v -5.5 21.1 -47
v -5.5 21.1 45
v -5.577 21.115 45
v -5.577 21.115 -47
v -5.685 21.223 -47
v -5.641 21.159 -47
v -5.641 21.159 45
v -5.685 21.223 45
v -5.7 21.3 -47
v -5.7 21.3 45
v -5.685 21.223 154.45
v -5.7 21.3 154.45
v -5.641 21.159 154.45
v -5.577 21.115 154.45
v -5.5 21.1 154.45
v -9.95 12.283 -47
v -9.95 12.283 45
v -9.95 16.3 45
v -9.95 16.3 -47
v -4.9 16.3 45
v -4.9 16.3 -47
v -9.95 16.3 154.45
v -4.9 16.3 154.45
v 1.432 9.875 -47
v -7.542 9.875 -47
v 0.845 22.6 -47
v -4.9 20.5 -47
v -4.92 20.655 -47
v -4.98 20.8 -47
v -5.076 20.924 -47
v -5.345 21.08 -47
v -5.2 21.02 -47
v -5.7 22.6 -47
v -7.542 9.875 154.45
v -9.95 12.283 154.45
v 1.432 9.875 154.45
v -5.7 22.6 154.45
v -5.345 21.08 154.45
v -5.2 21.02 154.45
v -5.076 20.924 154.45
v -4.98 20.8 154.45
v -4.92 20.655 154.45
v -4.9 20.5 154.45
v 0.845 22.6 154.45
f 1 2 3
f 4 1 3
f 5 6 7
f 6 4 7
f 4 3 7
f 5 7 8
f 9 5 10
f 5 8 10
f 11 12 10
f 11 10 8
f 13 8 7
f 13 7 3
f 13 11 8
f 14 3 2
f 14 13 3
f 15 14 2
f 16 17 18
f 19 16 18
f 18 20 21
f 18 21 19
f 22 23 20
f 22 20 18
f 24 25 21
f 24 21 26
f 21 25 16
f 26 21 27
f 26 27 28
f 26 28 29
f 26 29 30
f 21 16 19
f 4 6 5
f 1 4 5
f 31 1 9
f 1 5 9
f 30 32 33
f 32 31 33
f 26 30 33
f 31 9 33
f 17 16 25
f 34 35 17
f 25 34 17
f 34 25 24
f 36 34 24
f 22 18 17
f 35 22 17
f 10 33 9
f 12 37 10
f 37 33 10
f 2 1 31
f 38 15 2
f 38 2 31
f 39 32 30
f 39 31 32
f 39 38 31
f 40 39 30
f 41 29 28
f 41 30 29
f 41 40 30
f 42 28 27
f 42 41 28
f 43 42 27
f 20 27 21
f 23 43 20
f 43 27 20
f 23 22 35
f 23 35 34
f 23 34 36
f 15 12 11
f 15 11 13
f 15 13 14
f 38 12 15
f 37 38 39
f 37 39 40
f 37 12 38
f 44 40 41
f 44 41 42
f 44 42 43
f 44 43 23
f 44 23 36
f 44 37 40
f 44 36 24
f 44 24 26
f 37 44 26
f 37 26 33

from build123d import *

# Parameters (mm, degrees)
Y_RAIL_SLOT_DEPTH      = 45
Y_RAIL_CONT_DEPTH      = 2
Z_RAIL_SLOT_DEPTH      = 45
X_RAIL_SLOT_DEPTH      = 45
TOLERANCE_START        = -45
TOLERANCE_CUT_Z_DEPTH  = 45
TOLERANCE_CUT_Y_DEPTH  = 135.627263211
TOLERANCE_CUT_X_DEPTH  = 45
SHARP_CORNER_FILLETS_R = 0.2
CUT_EXTRUDE1_DEPTH     = 135.627263211
CUT_EXTRUDE2_START     = -45
CUT_EXTRUDE2_DEPTH     = 45
SKETCH25_W             = 5.05
SKETCH25_H             = 4.200000003
SKETCH25_W_2           = 5.050000001
SKETCH25_H_2           = 4.200000002
SKETCH25_W_3           = 19.75
SKETCH25_H_3           = 19.75
CUT_EXTRUDE3_DEPTH     = 118.874933721
FILLET1_R              = 0.4
CUT_EXTRUDE4_DEPTH     = 118.874933721
BOSS_EXTRUDE1_START    = 109.45
BOSS_EXTRUDE1_DEPTH    = 109.45


with BuildPart() as part:
    # Sketch10 → Y-Rail Slot (new, symmetric)
    with BuildSketch(Plane.XY):
        with BuildLine():
            ThreePointArc((22, -5.8), (22.353553391, -5.946446609), (22.5, -6.3))
            Line((22.5, -6.3), (22.5, -19.5))
            ThreePointArc((22.5, -19.5), (21.621320343, -21.621320344), (19.499999999, -22.500000001))
            Line((19.499999999, -22.500000001), (24.499999999, -22.500000001))
            Line((24.499999999, -22.500000001), (24.499999999, 24.499999999))
            Line((24.499999999, 24.499999999), (-22.500000001, 24.499999999))
            Line((-22.500000001, 24.499999999), (-22.500000001, 19.500000001))
            ThreePointArc((-22.500000001, 19.500000001), (-21.621320345, 21.621320345), (-19.500000001, 22.500000001))
            Line((-19.500000001, 22.500000001), (-6.300000002, 22.500000001))
            ThreePointArc((-6.300000002, 22.500000001), (-5.946446612, 22.353553392), (-5.800000002, 22.000000001))
            Line((-5.800000002, 22.000000001), (-5.800000002, 21.000000004))
            Line((-5.800000002, 21.000000004), (-5.499999997, 21.000000004))
            ThreePointArc((-5.499999997, 21.000000004), (-5.146446607, 20.853553394), (-4.999999997, 20.500000004))
            Line((-4.999999997, 20.500000004), (-4.999999997, 17.525000004))
            ThreePointArc((-4.999999997, 17.525000004), (-5.146446607, 17.171446613), (-5.499999997, 17.025000004))
            Line((-5.499999997, 17.025000004), (-9.549999997, 17.025000004))
            ThreePointArc((-9.549999997, 17.025000004), (-9.903553388, 16.878553395), (-10.049999997, 16.525000004))
            Line((-10.049999997, 16.525000004), (-10.049999997, 11.757106781))
            ThreePointArc((-10.049999997, 11.757106781), (-10.011939764, 11.565765065), (-9.903553388, 11.403553391))
            Line((-9.903553388, 11.403553391), (-6.499999999, 8.000000002))
            Line((-6.499999998, 8.000000003), (2e-09, 8.000000003))
            Line((2e-09, 8.000000003), (6.500000002, 8.000000003))
            Line((6.500000002, 8.000000003), (9.903553392, 11.403553393))
            ThreePointArc((9.903553392, 11.403553393), (10.011939767, 11.565765067), (10.050000001, 11.757106783))
            Line((10.050000001, 11.757106783), (10.050000001, 16.525000003))
            ThreePointArc((10.050000001, 16.525000003), (9.903553392, 16.878553394), (9.550000001, 17.025000003))
            Line((9.550000001, 17.025000003), (5.5, 17.025000003))
            ThreePointArc((5.5, 17.025000003), (5.146446609, 17.171446613), (5, 17.525000003))
            Line((5, 17.525000003), (5, 20.500000003))
            ThreePointArc((5, 20.500000003), (5.146446609, 20.853553393), (5.5, 21.000000003))
            Line((5.5, 21.000000003), (5.800000001, 21.000000003))
            Line((5.800000001, 21.000000003), (5.800000001, 22.000000001))
            ThreePointArc((5.800000001, 22.000000001), (5.94644661, 22.353553392), (6.300000001, 22.500000001))
            Line((6.300000001, 22.500000001), (19.500000001, 22.500000001))
            ThreePointArc((19.500000001, 22.500000001), (21.621320345, 21.621320345), (22.500000001, 19.500000001))
            Line((22.500000001, 19.500000001), (22.500000001, 6.300000002))
            ThreePointArc((22.500000001, 6.300000002), (22.353553392, 5.946446612), (22.000000001, 5.800000002))
            Line((22.000000001, 5.800000002), (21.000000002, 5.800000002))
            Line((21.000000002, 5.800000002), (21.000000002, 5.500000005))
            ThreePointArc((21.000000002, 5.500000005), (20.853553393, 5.146446614), (20.500000002, 5.000000005))
            Line((20.500000002, 5.000000005), (17.525000003, 5.000000005))
            ThreePointArc((17.525000003, 5.000000005), (17.171446612, 5.146446614), (17.025000003, 5.500000005))
            Line((17.025000003, 5.500000005), (17.025000003, 10.050000003))
            Line((17.025000003, 10.050000003), (11.757106782, 10.050000003))
            ThreePointArc((11.757106782, 10.050000003), (11.565765066, 10.011939769), (11.403553391, 9.903553394))
            Line((11.403553391, 9.903553394), (8.000000002, 6.500000004))
            Line((8.000000001, 6.500000005), (8.000000001, 3e-09))
            Line((8.000000001, 3e-09), (8.000000001, -6.499999999))
            Line((8.000000001, -6.499999999), (11.40355339, -9.903553388))
            ThreePointArc((11.40355339, -9.903553388), (11.565765064, -10.011939763), (11.75710678, -10.049999997))
            Line((11.75710678, -10.049999997), (16.525, -10.049999997))
            ThreePointArc((16.525, -10.049999997), (16.878553391, -9.903553388), (17.025000001, -9.549999997))
            Line((17.025000001, -9.549999997), (17.025000001, -5.499999996))
            ThreePointArc((17.025000001, -5.499999996), (17.17144661, -5.146446605), (17.525000001, -4.999999996))
            Line((17.525000001, -4.999999996), (20.5, -4.999999996))
            ThreePointArc((20.5, -4.999999996), (20.853553391, -5.146446605), (21, -5.499999996))
            Line((21, -5.499999996), (21, -5.8))
            Line((21, -5.8), (22, -5.8))
        make_face()
    extrude(amount=Y_RAIL_SLOT_DEPTH, both=True)

    # Sketch12 → Y-Rail cont. (add)
    with BuildSketch(Plane(origin=(0, 0, -45), x_dir=(-1, 0, 0), z_dir=(0, 0, -1))):
        with BuildLine():
            Line((-22.5, -19.5), (-22.5, -6.3))
            ThreePointArc((-22.5, -6.3), (-22.353553391, -5.946446609), (-22, -5.8))
            Line((-22, -5.8), (-21, -5.8))
            Line((-21, -5.8), (-21, -5.499999996))
            ThreePointArc((-21, -5.499999996), (-20.853553391, -5.146446605), (-20.5, -4.999999996))
            Line((-20.5, -4.999999996), (-17.525000001, -4.999999996))
            ThreePointArc((-17.525000001, -4.999999996), (-17.17144661, -5.146446605), (-17.025000001, -5.499999996))
            Line((-17.025000001, -5.499999996), (-17.025000001, -9.549999997))
            ThreePointArc((-17.025000001, -9.549999997), (-16.878553391, -9.903553388), (-16.525, -10.049999997))
            Line((-16.525, -10.049999997), (-11.75710678, -10.049999997))
            ThreePointArc((-11.75710678, -10.049999997), (-11.565765064, -10.011939763), (-11.40355339, -9.903553388))
            Line((-11.40355339, -9.903553388), (-8.000000001, -6.499999999))
            Line((-8.000000001, -6.499999999), (-8.000000001, 6.500000003))
            Line((-8.000000001, 6.500000003), (-11.403553391, 9.903553394))
            ThreePointArc((-11.403553391, 9.903553394), (-11.565765066, 10.011939769), (-11.757106782, 10.050000003))
            Line((-11.757106782, 10.050000003), (-17.025000003, 10.050000003))
            Line((-17.025000003, 10.050000003), (-17.025000003, 5.500000005))
            ThreePointArc((-17.025000003, 5.500000005), (-17.171446612, 5.146446614), (-17.525000003, 5.000000005))
            Line((-17.525000003, 5.000000005), (-20.500000002, 5.000000005))
            ThreePointArc((-20.500000002, 5.000000005), (-20.853553393, 5.146446614), (-21.000000002, 5.500000005))
            Line((-21.000000002, 5.500000005), (-21.000000002, 5.800000002))
            Line((-21.000000002, 5.800000002), (-22.000000001, 5.800000002))
            ThreePointArc((-22.000000001, 5.800000002), (-22.353553392, 5.946446612), (-22.500000001, 6.300000002))
            Line((-22.500000001, 6.300000002), (-22.500000001, 19.500000001))
            ThreePointArc((-22.500000001, 19.500000001), (-21.621320345, 21.621320345), (-19.500000001, 22.500000001))
            Line((-19.500000001, 22.500000001), (-6.300000001, 22.500000001))
            ThreePointArc((-6.300000001, 22.500000001), (-5.94644661, 22.353553392), (-5.800000001, 22.000000001))
            Line((-5.800000001, 22.000000001), (-5.800000001, 21.000000003))
            Line((-5.800000001, 21.000000003), (-5.5, 21.000000003))
            ThreePointArc((-5.5, 21.000000003), (-5.146446609, 20.853553393), (-5, 20.500000003))
            Line((-5, 20.500000003), (-5, 17.525000003))
            ThreePointArc((-5, 17.525000003), (-5.146446609, 17.171446613), (-5.5, 17.025000003))
            Line((-5.5, 17.025000003), (-9.550000001, 17.025000003))
            ThreePointArc((-9.550000001, 17.025000003), (-9.903553392, 16.878553394), (-10.050000001, 16.525000003))
            Line((-10.050000001, 16.525000003), (-10.050000001, 11.757106783))
            ThreePointArc((-10.050000001, 11.757106783), (-10.011939767, 11.565765067), (-9.903553392, 11.403553393))
            Line((-9.903553392, 11.403553393), (-6.500000002, 8.000000003))
            Line((-6.500000002, 8.000000003), (6.5, 8.000000003))
            Line((6.5, 8.000000003), (9.903553388, 11.403553391))
            ThreePointArc((9.903553388, 11.403553391), (10.011939764, 11.565765065), (10.049999997, 11.757106781))
            Line((10.049999997, 11.757106781), (10.049999997, 16.525000004))
            ThreePointArc((10.049999997, 16.525000004), (9.903553388, 16.878553395), (9.549999997, 17.025000004))
            Line((9.549999997, 17.025000004), (5.499999997, 17.025000004))
            ThreePointArc((5.499999997, 17.025000004), (5.146446607, 17.171446613), (4.999999997, 17.525000004))
            Line((4.999999997, 17.525000004), (4.999999997, 20.500000004))
            ThreePointArc((4.999999997, 20.500000004), (5.146446607, 20.853553394), (5.499999997, 21.000000004))
            Line((5.499999997, 21.000000004), (5.800000002, 21.000000004))
            Line((5.800000002, 21.000000004), (5.800000002, 22.000000001))
            ThreePointArc((5.800000002, 22.000000001), (5.946446612, 22.353553392), (6.300000002, 22.500000001))
            Line((6.300000002, 22.500000001), (19.500000001, 22.500000001))
            ThreePointArc((19.500000001, 22.500000001), (21.621320345, 21.621320345), (22.500000001, 19.500000001))
            Line((22.500000001, 19.500000001), (22.500000001, 24.499999999))
            Line((22.500000001, 24.499999999), (-24.499999999, 24.499999999))
            Line((-24.499999999, 24.499999999), (-24.499999999, -22.500000001))
            Line((-24.499999999, -22.500000001), (-19.499999999, -22.500000001))
            ThreePointArc((-19.499999999, -22.500000001), (-21.621320343, -21.621320344), (-22.5, -19.5))
        make_face()
    extrude(amount=Y_RAIL_CONT_DEPTH)

    # Sketch17 → Z-Rail Slot (add)
    with BuildSketch(Plane(origin=(0, 24.499999999, 0), x_dir=(1, 0, 0), z_dir=(0, 1, 0))):
        with BuildLine():
            Line((19.499999999, -45), (24.499999999, -45))
            Line((24.499999999, -45), (24.499999999, 2))
            Line((24.499999999, 2), (-22.500000001, 2))
            Line((-22.500000001, 2), (-22.500000001, -2.999999998))
            ThreePointArc((-22.500000001, -2.999999998), (-21.621320345, -0.878679654), (-19.500000001, 2e-09))
            Line((-19.500000001, 2e-09), (-6.300000002, 2e-09))
            ThreePointArc((-6.300000002, 2e-09), (-5.946446612, -0.146446607), (-5.800000002, -0.499999998))
            Line((-5.800000002, -0.499999998), (-5.800000002, -1.499999995))
            Line((-5.800000002, -1.499999995), (-5.499999997, -1.499999995))
            ThreePointArc((-5.499999997, -1.499999995), (-5.146446607, -1.646446605), (-4.999999997, -1.999999995))
            Line((-4.999999997, -1.999999995), (-4.999999997, -4.974999995))
            ThreePointArc((-4.999999997, -4.974999995), (-5.146446607, -5.328553385), (-5.499999997, -5.474999995))
            Line((-5.499999997, -5.474999995), (-9.549999997, -5.474999995))
            ThreePointArc((-9.549999997, -5.474999995), (-9.903553388, -5.621446604), (-10.049999997, -5.974999995))
            Line((-10.049999997, -5.974999995), (-10.049999997, -10.742893218))
            ThreePointArc((-10.049999997, -10.742893218), (-10.011939764, -10.934234934), (-9.903553388, -11.096446608))
            Line((-9.903553388, -11.096446608), (-6.5, -14.499999996))
            Line((-6.5, -14.499999996), (6.500000002, -14.499999996))
            Line((6.500000002, -14.499999996), (9.903553392, -11.096446606))
            ThreePointArc((9.903553392, -11.096446606), (10.011939767, -10.934234932), (10.050000001, -10.742893216))
            Line((10.050000001, -10.742893216), (10.050000001, -5.974999996))
            ThreePointArc((10.050000001, -5.974999996), (9.903553392, -5.621446605), (9.550000001, -5.474999996))
            Line((9.550000001, -5.474999996), (5.5, -5.474999996))
            ThreePointArc((5.5, -5.474999996), (5.146446609, -5.328553386), (5, -4.974999996))
            Line((5, -4.974999996), (5, -1.999999996))
            ThreePointArc((5, -1.999999996), (5.146446609, -1.646446606), (5.5, -1.499999996))
            Line((5.5, -1.499999996), (5.800000001, -1.499999996))
            Line((5.800000001, -1.499999996), (5.800000001, -0.499999998))
            ThreePointArc((5.800000001, -0.499999998), (5.94644661, -0.146446607), (6.300000001, 2e-09))
            Line((6.300000001, 2e-09), (19.500000001, 2e-09))
            ThreePointArc((19.500000001, 2e-09), (21.621320345, -0.878679654), (22.500000001, -2.999999998))
            Line((22.500000001, -2.999999998), (22.500000001, -16.199999997))
            ThreePointArc((22.500000001, -16.199999997), (22.353553392, -16.553553387), (22.000000001, -16.699999997))
            Line((22.000000001, -16.699999997), (21.000000002, -16.699999997))
            Line((21.000000002, -16.699999997), (21.000000002, -16.999999994))
            ThreePointArc((21.000000002, -16.999999994), (20.853553393, -17.353553385), (20.500000002, -17.499999994))
            Line((20.500000002, -17.499999994), (17.525000003, -17.499999994))
            ThreePointArc((17.525000003, -17.499999994), (17.171446612, -17.353553385), (17.025000003, -16.999999994))
            Line((17.025000003, -16.999999994), (17.025000003, -12.449999996))
            Line((17.025000003, -12.449999996), (11.757106782, -12.449999996))
            ThreePointArc((11.757106782, -12.449999996), (11.565765066, -12.48806023), (11.403553391, -12.596446605))
            Line((11.403553391, -12.596446605), (8.000000001, -15.999999995))
            Line((8.000000001, -15.999999995), (8.000000001, -28.999999998))
            Line((8.000000001, -28.999999998), (11.40355339, -32.403553387))
            ThreePointArc((11.40355339, -32.403553387), (11.565765064, -32.511939762), (11.75710678, -32.549999996))
            Line((11.75710678, -32.549999996), (16.525, -32.549999996))
            ThreePointArc((16.525, -32.549999996), (16.878553391, -32.403553386), (17.025000001, -32.049999996))
            Line((17.025000001, -32.049999996), (17.025000001, -27.999999995))
            ThreePointArc((17.025000001, -27.999999995), (17.17144661, -27.646446604), (17.525000001, -27.499999995))
            Line((17.525000001, -27.499999995), (20.5, -27.499999995))
            ThreePointArc((20.5, -27.499999995), (20.853553391, -27.646446604), (21, -27.999999995))
            Line((21, -27.999999995), (21, -28.299999999))
            Line((21, -28.299999999), (22, -28.299999999))
            ThreePointArc((22, -28.299999999), (22.353553391, -28.446446608), (22.5, -28.799999999))
            Line((22.5, -28.799999999), (22.5, -41.999999999))
            ThreePointArc((22.5, -41.999999999), (21.621320343, -44.121320343), (19.499999999, -45))
        make_face()
    extrude(amount=Z_RAIL_SLOT_DEPTH)

    # Sketch11 → X-Rail Slot (add)
    with BuildSketch(Plane(origin=(24.499999999, 0, 0), x_dir=(0, 0, -1), z_dir=(1, 0, 0))):
        with BuildLine():
            ThreePointArc((16.2, 22.5), (16.553553391, 22.353553391), (16.7, 22))
            Line((16.7, 22), (16.7, 21))
            Line((16.7, 21), (17, 21))
            ThreePointArc((17, 21), (17.353553391, 20.853553391), (17.5, 20.5))
            Line((17.5, 20.5), (17.5, 17.525))
            ThreePointArc((17.5, 17.525), (17.353553391, 17.171446609), (17, 17.025))
            Line((17, 17.025), (12.95, 17.025))
            ThreePointArc((12.95, 17.025), (12.596446609, 16.878553391), (12.45, 16.525))
            Line((12.45, 16.525), (12.45, 11.757106781))
            ThreePointArc((12.45, 11.757106781), (12.488060234, 11.565765065), (12.596446609, 11.403553391))
            Line((12.596446609, 11.403553391), (16, 8))
            Line((16, 8), (22.5, 8))
            Line((22.5, 8), (29, 8))
            Line((29, 8), (32.403553391, 11.403553391))
            ThreePointArc((32.403553391, 11.403553391), (32.511939766, 11.565765065), (32.55, 11.757106781))
            Line((32.55, 11.757106781), (32.55, 17.025))
            Line((32.55, 17.025), (28, 17.025))
            ThreePointArc((28, 17.025), (27.646446609, 17.171446609), (27.5, 17.525))
            Line((27.5, 17.525), (27.5, 20.5))
            ThreePointArc((27.5, 20.5), (27.646446609, 20.853553391), (28, 21))
            Line((28, 21), (28.3, 21))
            Line((28.3, 21), (28.3, 22))
            ThreePointArc((28.3, 22), (28.446446609, 22.353553391), (28.8, 22.5))
            Line((28.8, 22.5), (42, 22.5))
            ThreePointArc((42, 22.5), (44.121320344, 21.621320344), (45, 19.5))
            Line((45, 19.5), (45, 6.3))
            ThreePointArc((45, 6.3), (44.853553391, 5.946446609), (44.5, 5.8))
            Line((44.5, 5.8), (43.5, 5.8))
            Line((43.5, 5.8), (43.5, 5.5))
            ThreePointArc((43.5, 5.5), (43.353553391, 5.146446609), (43, 5))
            Line((43, 5), (40.025, 5))
            ThreePointArc((40.025, 5), (39.671446609, 5.146446609), (39.525, 5.5))
            Line((39.525, 5.5), (39.525, 9.55))
            ThreePointArc((39.525, 9.55), (39.378553391, 9.903553391), (39.025, 10.05))
            Line((39.025, 10.05), (34.257106781, 10.05))
            ThreePointArc((34.257106781, 10.05), (34.065765065, 10.011939766), (33.903553391, 9.903553391))
            Line((33.903553391, 9.903553391), (30.5, 6.5))
            Line((30.5, 6.5), (30.5, 0))
            Line((30.5, 0), (30.5, -6.5))
            Line((30.5, -6.5), (33.903553391, -9.903553391))
            ThreePointArc((33.903553391, -9.903553391), (34.065765065, -10.011939766), (34.257106781, -10.05))
            Line((34.257106781, -10.05), (39.025, -10.05))
            ThreePointArc((39.025, -10.05), (39.378553391, -9.903553391), (39.525, -9.55))
            Line((39.525, -9.55), (39.525, -5.5))
            ThreePointArc((39.525, -5.5), (39.671446609, -5.146446609), (40.025, -5))
            Line((40.025, -5), (43, -5))
            ThreePointArc((43, -5), (43.353553391, -5.146446609), (43.5, -5.5))
            Line((43.5, -5.5), (43.5, -5.8))
            Line((43.5, -5.8), (44.5, -5.8))
            ThreePointArc((44.5, -5.8), (44.853553391, -5.946446609), (45, -6.3))
            Line((45, -6.3), (45, -19.5))
            ThreePointArc((45, -19.5), (44.121320344, -21.621320344), (42, -22.5))
            Line((42, -22.5), (47, -22.500000001))
            Line((47, -22.500000001), (47, 24.499999999))
            Line((47, 24.499999999), (-45, 24.499999999))
            Line((-45, 24.499999999), (-45, 19.5))
            ThreePointArc((-45, 19.5), (-44.121320344, 21.621320344), (-42, 22.5))
            Line((-42, 22.5), (-28.8, 22.5))
            ThreePointArc((-28.8, 22.5), (-28.446446609, 22.353553391), (-28.3, 22))
            Line((-28.3, 22), (-28.3, 21))
            Line((-28.3, 21), (-28, 21))
            ThreePointArc((-28, 21), (-27.646446609, 20.853553391), (-27.5, 20.5))
            Line((-27.5, 20.5), (-27.5, 17.525))
            ThreePointArc((-27.5, 17.525), (-27.646446609, 17.171446609), (-28, 17.025))
            Line((-28, 17.025), (-32.55, 17.025))
            Line((-32.55, 17.025), (-32.55, 11.757106781))
            ThreePointArc((-32.55, 11.757106781), (-32.511939766, 11.565765065), (-32.403553391, 11.403553391))
            Line((-32.403553391, 11.403553391), (-29, 8))
            Line((-29, 8), (-22.5, 8))
            Line((-22.5, 8), (-16, 8))
            Line((-16, 8), (-12.596446609, 11.403553391))
            ThreePointArc((-12.596446609, 11.403553391), (-12.488060234, 11.565765065), (-12.45, 11.757106781))
            Line((-12.45, 11.757106781), (-12.45, 16.525))
            ThreePointArc((-12.45, 16.525), (-12.596446609, 16.878553391), (-12.95, 17.025))
            Line((-12.95, 17.025), (-17, 17.025))
            ThreePointArc((-17, 17.025), (-17.353553391, 17.171446609), (-17.5, 17.525))
            Line((-17.5, 17.525), (-17.5, 20.5))
            ThreePointArc((-17.5, 20.5), (-17.353553391, 20.853553391), (-17, 21))
            Line((-17, 21), (-16.7, 21))
            Line((-16.7, 21), (-16.7, 22))
            ThreePointArc((-16.7, 22), (-16.553553391, 22.353553391), (-16.2, 22.5))
            Line((-16.2, 22.5), (-7.8, 22.5))
            Line((-7.8, 22.5), (-7.8, 21.5))
            ThreePointArc((-7.8, 21.5), (-7.653553391, 21.146446609), (-7.3, 21))
            Line((-7.3, 21), (7.3, 21))
            ThreePointArc((7.3, 21), (7.653553391, 21.146446609), (7.8, 21.5))
            Line((7.8, 21.5), (7.8, 22.5))
            Line((7.8, 22.5), (16.2, 22.5))
        make_face()
    extrude(amount=X_RAIL_SLOT_DEPTH)

    # Sketch20 → Tolerance Cut Z (cut)
    with BuildSketch(Plane(origin=(0, 69.499999999, 0), x_dir=(1, 0, 0), z_dir=(0, 1, 0)).offset(TOLERANCE_START)):
        with BuildLine():
            ThreePointArc((-22.500000001, -2.999999998), (-21.621320345, -0.878679654), (-19.500000001, 2e-09))
            Line((-19.500000001, 2e-09), (-6.300000002, 2e-09))
            ThreePointArc((-6.300000002, 2e-09), (-5.946446612, -0.146446607), (-5.800000002, -0.499999998))
            Line((-5.800000002, -0.499999998), (-5.800000002, -1.499999995))
            Line((-5.800000002, -1.499999995), (-5.499999997, -1.499999995))
            ThreePointArc((-5.499999997, -1.499999995), (-5.146446607, -1.646446605), (-4.999999997, -1.999999995))
            Line((-4.999999997, -1.999999995), (-4.999999997, -4.974999995))
            ThreePointArc((-4.999999997, -4.974999995), (-5.146446607, -5.328553385), (-5.499999997, -5.474999995))
            Line((-5.499999997, -5.474999995), (-9.549999997, -5.474999995))
            ThreePointArc((-9.549999997, -5.474999995), (-9.903553388, -5.621446604), (-10.049999997, -5.974999995))
            Line((-10.049999997, -5.974999995), (-10.049999997, -10.742893218))
            ThreePointArc((-10.049999997, -10.742893218), (-10.011939764, -10.934234934), (-9.903553388, -11.096446608))
            Line((-9.903553388, -11.096446608), (-6.5, -14.499999996))
            Line((-6.5, -14.499999996), (6.500000002, -14.499999996))
            Line((6.500000002, -14.499999996), (9.903553392, -11.096446606))
            ThreePointArc((9.903553392, -11.096446606), (10.011939767, -10.934234932), (10.050000001, -10.742893216))
            Line((10.050000001, -10.742893216), (10.050000001, -5.974999996))
            ThreePointArc((10.050000001, -5.974999996), (9.903553392, -5.621446605), (9.550000001, -5.474999996))
            Line((9.550000001, -5.474999996), (5.5, -5.474999996))
            ThreePointArc((5.5, -5.474999996), (5.146446609, -5.328553386), (5, -4.974999996))
            Line((5, -4.974999996), (5, -1.999999996))
            ThreePointArc((5, -1.999999996), (5.146446609, -1.646446606), (5.5, -1.499999996))
            Line((5.5, -1.499999996), (5.800000001, -1.499999996))
            Line((5.800000001, -1.499999996), (5.800000001, -0.499999998))
            ThreePointArc((5.800000001, -0.499999998), (5.94644661, -0.146446607), (6.300000001, 2e-09))
            Line((6.300000001, 2e-09), (19.500000001, 2e-09))
            ThreePointArc((19.500000001, 2e-09), (21.621320345, -0.878679654), (22.500000001, -2.999999998))
            Line((22.500000001, -2.999999998), (22.500000001, -16.199999997))
            ThreePointArc((22.500000001, -16.199999997), (22.353553392, -16.553553387), (22.000000001, -16.699999997))
            Line((22.000000001, -16.699999997), (21.000000002, -16.699999997))
            Line((21.000000002, -16.699999997), (21.000000002, -16.999999994))
            ThreePointArc((21.000000002, -16.999999994), (20.853553393, -17.353553385), (20.500000002, -17.499999994))
            Line((20.500000002, -17.499999994), (17.525000003, -17.499999994))
            ThreePointArc((17.525000003, -17.499999994), (17.171446612, -17.353553385), (17.025000003, -16.999999994))
            Line((17.025000003, -16.999999994), (17.025000003, -12.449999996))
            Line((17.025000003, -12.449999996), (11.757106782, -12.449999996))
            ThreePointArc((11.757106782, -12.449999996), (11.565765066, -12.48806023), (11.403553391, -12.596446605))
            Line((11.403553391, -12.596446605), (8.000000001, -15.999999995))
            Line((8.000000001, -15.999999995), (8.000000001, -28.999999998))
            Line((8.000000001, -28.999999998), (11.40355339, -32.403553387))
            ThreePointArc((11.40355339, -32.403553387), (11.565765064, -32.511939762), (11.75710678, -32.549999996))
            Line((11.75710678, -32.549999996), (16.525, -32.549999996))
            ThreePointArc((16.525, -32.549999996), (16.878553391, -32.403553386), (17.025000001, -32.049999996))
            Line((17.025000001, -32.049999996), (17.025000001, -27.999999995))
            ThreePointArc((17.025000001, -27.999999995), (17.17144661, -27.646446604), (17.525000001, -27.499999995))
            Line((17.525000001, -27.499999995), (20.5, -27.499999995))
            ThreePointArc((20.5, -27.499999995), (20.853553391, -27.646446604), (21, -27.999999995))
            Line((21, -27.999999995), (21, -28.299999999))
            Line((21, -28.299999999), (22, -28.299999999))
            ThreePointArc((22, -28.299999999), (22.353553391, -28.446446608), (22.5, -28.799999999))
            Line((22.5, -28.799999999), (22.5, -41.999999999))
            ThreePointArc((22.5, -41.999999999), (21.621320343, -44.121320343), (19.499999999, -45))
            Line((19.499999999, -45), (19.499999999, -45.1))
            ThreePointArc((19.499999999, -45.1), (21.692031022, -44.192031021), (22.6, -41.999999999))
            Line((22.6, -41.999999999), (22.6, -28.799999999))
            ThreePointArc((22.6, -28.799999999), (22.424264069, -28.37573593), (22, -28.199999999))
            Line((22, -28.199999999), (21.1, -28.199999999))
            Line((21.1, -28.199999999), (21.1, -27.999999995))
            ThreePointArc((21.1, -27.999999995), (20.924264069, -27.575735926), (20.5, -27.399999995))
            Line((20.5, -27.399999995), (17.525000001, -27.399999995))
            ThreePointArc((17.525000001, -27.399999995), (17.100735932, -27.575735926), (16.925000001, -27.999999995))
            Line((16.925000001, -27.999999995), (16.925000001, -32.049999996))
            ThreePointArc((16.925000001, -32.049999996), (16.807842713, -32.332842708), (16.525, -32.449999996))
            Line((16.525, -32.449999996), (11.75710678, -32.449999996))
            ThreePointArc((11.75710678, -32.449999996), (11.604033408, -32.419551809), (11.474264068, -32.332842709))
            Line((11.474264068, -32.332842709), (8.100000001, -28.958578641))
            Line((8.100000001, -28.958578641), (8.100000001, -16.041421352))
            Line((8.100000001, -16.041421352), (11.474264069, -12.667157283))
            ThreePointArc((11.474264069, -12.667157283), (11.604033409, -12.580448183), (11.757106782, -12.549999996))
            Line((11.757106782, -12.549999996), (16.925000003, -12.549999996))
            Line((16.925000003, -12.549999996), (16.925000003, -16.999999994))
            ThreePointArc((16.925000003, -16.999999994), (17.100735934, -17.424264063), (17.525000003, -17.599999994))
            Line((17.525000003, -17.599999994), (20.500000002, -17.599999994))
            ThreePointArc((20.500000002, -17.599999994), (20.924264071, -17.424264063), (21.100000002, -16.999999994))
            Line((21.100000002, -16.999999994), (21.100000002, -16.799999997))
            Line((21.100000002, -16.799999997), (22.000000001, -16.799999997))
            ThreePointArc((22.000000001, -16.799999997), (22.42426407, -16.624264066), (22.600000001, -16.199999997))
            Line((22.600000001, -16.199999997), (22.600000001, -2.999999998))
            ThreePointArc((22.600000001, -2.999999998), (21.692031023, -0.807968976), (19.500000001, 0.100000002))
            Line((19.500000001, 0.100000002), (6.300000001, 0.100000002))
            ThreePointArc((6.300000001, 0.100000002), (5.875735932, -0.075735929), (5.700000001, -0.499999998))
            Line((5.700000001, -0.499999998), (5.700000001, -1.399999996))
            Line((5.700000001, -1.399999996), (5.5, -1.399999996))
            ThreePointArc((5.5, -1.399999996), (5.075735931, -1.575735927), (4.9, -1.999999996))
            Line((4.9, -1.999999996), (4.9, -4.974999996))
            ThreePointArc((4.9, -4.974999996), (5.075735931, -5.399264064), (5.5, -5.574999996))
            Line((5.5, -5.574999996), (9.550000001, -5.574999996))
            ThreePointArc((9.550000001, -5.574999996), (9.832842713, -5.692157283), (9.950000001, -5.974999996))
            Line((9.950000001, -5.974999996), (9.950000001, -10.742893216))
            ThreePointArc((9.950000001, -10.742893216), (9.919551814, -10.895966589), (9.832842714, -11.025735928))
            Line((9.832842714, -11.025735928), (6.458578646, -14.399999996))
            Line((6.458578646, -14.399999996), (-6.458578644, -14.399999996))
            Line((-6.458578644, -14.399999996), (-9.83284271, -11.02573593))
            ThreePointArc((-9.83284271, -11.02573593), (-9.91955181, -10.89596659), (-9.949999997, -10.742893218))
            Line((-9.949999997, -10.742893218), (-9.949999997, -5.974999995))
            ThreePointArc((-9.949999997, -5.974999995), (-9.83284271, -5.692157282), (-9.549999997, -5.574999995))
            Line((-9.549999997, -5.574999995), (-5.499999997, -5.574999995))
            ThreePointArc((-5.499999997, -5.574999995), (-5.075735928, -5.399264064), (-4.899999997, -4.974999995))
            Line((-4.899999997, -4.974999995), (-4.899999997, -1.999999995))
            ThreePointArc((-4.899999997, -1.999999995), (-5.075735928, -1.575735927), (-5.499999997, -1.399999995))
            Line((-5.499999997, -1.399999995), (-5.700000002, -1.399999995))
            Line((-5.700000002, -1.399999995), (-5.700000002, -0.499999998))
            ThreePointArc((-5.700000002, -0.499999998), (-5.875735933, -0.075735929), (-6.300000002, 0.100000002))
            Line((-6.300000002, 0.100000002), (-19.500000001, 0.100000002))
            ThreePointArc((-19.500000001, 0.100000002), (-21.692031023, -0.807968976), (-22.600000001, -2.999999998))
            Line((-22.600000001, -2.999999998), (-22.500000001, -2.999999998))
        make_face()
    extrude(amount=TOLERANCE_CUT_Z_DEPTH, mode=Mode.SUBTRACT)

    # Sketch21 → Tolerance Cut Y (cut, through all)
    with BuildSketch(Plane.XY.offset(45)):
        with BuildLine():
            ThreePointArc((-22.500000001, 19.500000001), (-21.621320345, 21.621320345), (-19.500000001, 22.500000001))
            Line((-19.500000001, 22.500000001), (-6.300000002, 22.500000001))
            ThreePointArc((-6.300000002, 22.500000001), (-5.946446612, 22.353553392), (-5.800000002, 22.000000001))
            Line((-5.800000002, 22.000000001), (-5.800000002, 21.000000004))
            Line((-5.800000002, 21.000000004), (-5.499999997, 21.000000004))
            ThreePointArc((-5.499999997, 21.000000004), (-5.146446607, 20.853553394), (-4.999999997, 20.500000004))
            Line((-4.999999997, 20.500000004), (-4.999999997, 17.525000004))
            ThreePointArc((-4.999999997, 17.525000004), (-5.146446607, 17.171446613), (-5.499999997, 17.025000004))
            Line((-5.499999997, 17.025000004), (-9.549999997, 17.025000004))
            ThreePointArc((-9.549999997, 17.025000004), (-9.903553388, 16.878553395), (-10.049999997, 16.525000004))
            Line((-10.049999997, 16.525000004), (-10.049999997, 11.757106781))
            ThreePointArc((-10.049999997, 11.757106781), (-10.011939764, 11.565765065), (-9.903553388, 11.403553391))
            Line((-9.903553388, 11.403553391), (-6.5, 8.000000003))
            Line((-6.5, 8.000000003), (6.500000002, 8.000000003))
            Line((6.500000002, 8.000000003), (9.903553392, 11.403553393))
            ThreePointArc((9.903553392, 11.403553393), (10.011939767, 11.565765067), (10.050000001, 11.757106783))
            Line((10.050000001, 11.757106783), (10.050000001, 16.525000003))
            ThreePointArc((10.050000001, 16.525000003), (9.903553392, 16.878553394), (9.550000001, 17.025000003))
            Line((9.550000001, 17.025000003), (5.5, 17.025000003))
            ThreePointArc((5.5, 17.025000003), (5.146446609, 17.171446613), (5, 17.525000003))
            Line((5, 17.525000003), (5, 20.500000003))
            ThreePointArc((5, 20.500000003), (5.146446609, 20.853553393), (5.5, 21.000000003))
            Line((5.5, 21.000000003), (5.800000001, 21.000000003))
            Line((5.800000001, 21.000000003), (5.800000001, 22.000000001))
            ThreePointArc((5.800000001, 22.000000001), (5.94644661, 22.353553392), (6.300000001, 22.500000001))
            Line((6.300000001, 22.500000001), (19.500000001, 22.500000001))
            ThreePointArc((19.500000001, 22.500000001), (21.621320345, 21.621320345), (22.500000001, 19.500000001))
            Line((22.500000001, 19.500000001), (22.500000001, 6.300000002))
            ThreePointArc((22.500000001, 6.300000002), (22.353553392, 5.946446612), (22.000000001, 5.800000002))
            Line((22.000000001, 5.800000002), (21.000000002, 5.800000002))
            Line((21.000000002, 5.800000002), (21.000000002, 5.500000005))
            ThreePointArc((21.000000002, 5.500000005), (20.853553393, 5.146446614), (20.500000002, 5.000000005))
            Line((20.500000002, 5.000000005), (17.525000003, 5.000000005))
            ThreePointArc((17.525000003, 5.000000005), (17.171446612, 5.146446614), (17.025000003, 5.500000005))
            Line((17.025000003, 5.500000005), (17.025000003, 10.050000003))
            Line((17.025000003, 10.050000003), (11.757106782, 10.050000003))
            ThreePointArc((11.757106782, 10.050000003), (11.565765066, 10.011939769), (11.403553391, 9.903553394))
            Line((11.403553391, 9.903553394), (8.000000001, 6.500000003))
            Line((8.000000001, 6.500000003), (8.000000001, -6.499999999))
            Line((8.000000001, -6.499999999), (11.40355339, -9.903553388))
            ThreePointArc((11.40355339, -9.903553388), (11.565765064, -10.011939763), (11.75710678, -10.049999997))
            Line((11.75710678, -10.049999997), (16.525, -10.049999997))
            ThreePointArc((16.525, -10.049999997), (16.878553391, -9.903553388), (17.025000001, -9.549999997))
            Line((17.025000001, -9.549999997), (17.025000001, -5.499999996))
            ThreePointArc((17.025000001, -5.499999996), (17.17144661, -5.146446605), (17.525000001, -4.999999996))
            Line((17.525000001, -4.999999996), (20.5, -4.999999996))
            ThreePointArc((20.5, -4.999999996), (20.853553391, -5.146446605), (21, -5.499999996))
            Line((21, -5.499999996), (21, -5.8))
            Line((21, -5.8), (22, -5.8))
            ThreePointArc((22, -5.8), (22.353553391, -5.946446609), (22.5, -6.3))
            Line((22.5, -6.3), (22.5, -19.5))
            ThreePointArc((22.5, -19.5), (21.621320343, -21.621320344), (19.499999999, -22.500000001))
            Line((19.499999999, -22.500000001), (19.499999999, -22.600000001))
            ThreePointArc((19.499999999, -22.600000001), (21.692031022, -21.692031022), (22.6, -19.5))
            Line((22.6, -19.5), (22.6, -6.3))
            ThreePointArc((22.6, -6.3), (22.424264069, -5.875735931), (22, -5.7))
            Line((22, -5.7), (21.1, -5.7))
            Line((21.1, -5.7), (21.1, -5.499999996))
            ThreePointArc((21.1, -5.499999996), (20.924264069, -5.075735927), (20.5, -4.899999996))
            Line((20.5, -4.899999996), (17.525000001, -4.899999996))
            ThreePointArc((17.525000001, -4.899999996), (17.100735932, -5.075735927), (16.925000001, -5.499999996))
            Line((16.925000001, -5.499999996), (16.925000001, -9.549999997))
            ThreePointArc((16.925000001, -9.549999997), (16.807842713, -9.832842709), (16.525, -9.949999997))
            Line((16.525, -9.949999997), (11.75710678, -9.949999997))
            ThreePointArc((11.75710678, -9.949999997), (11.604033408, -9.91955181), (11.474264068, -9.83284271))
            Line((11.474264068, -9.83284271), (8.100000001, -6.458578642))
            Line((8.100000001, -6.458578642), (8.100000001, 6.458578647))
            Line((8.100000001, 6.458578647), (11.474264069, 9.832842716))
            ThreePointArc((11.474264069, 9.832842716), (11.604033409, 9.919551816), (11.757106782, 9.950000003))
            Line((11.757106782, 9.950000003), (16.925000003, 9.950000003))
            Line((16.925000003, 9.950000003), (16.925000003, 5.500000005))
            ThreePointArc((16.925000003, 5.500000005), (17.100735934, 5.075735936), (17.525000003, 4.900000005))
            Line((17.525000003, 4.900000005), (20.500000002, 4.900000005))
            ThreePointArc((20.500000002, 4.900000005), (20.924264071, 5.075735936), (21.100000002, 5.500000005))
            Line((21.100000002, 5.500000005), (21.100000002, 5.700000002))
            Line((21.100000002, 5.700000002), (22.000000001, 5.700000002))
            ThreePointArc((22.000000001, 5.700000002), (22.42426407, 5.875735933), (22.600000001, 6.300000002))
            Line((22.600000001, 6.300000002), (22.600000001, 19.500000001))
            ThreePointArc((22.600000001, 19.500000001), (21.692031023, 21.692031023), (19.500000001, 22.600000001))
            Line((19.500000001, 22.600000001), (6.300000001, 22.600000001))
            ThreePointArc((6.300000001, 22.600000001), (5.875735932, 22.42426407), (5.700000001, 22.000000001))
            Line((5.700000001, 22.000000001), (5.700000001, 21.100000003))
            Line((5.700000001, 21.100000003), (5.5, 21.100000003))
            ThreePointArc((5.5, 21.100000003), (5.075735931, 20.924264072), (4.9, 20.500000003))
            Line((4.9, 20.500000003), (4.9, 17.525000003))
            ThreePointArc((4.9, 17.525000003), (5.075735931, 17.100735935), (5.5, 16.925000003))
            Line((5.5, 16.925000003), (9.550000001, 16.925000003))
            ThreePointArc((9.550000001, 16.925000003), (9.832842713, 16.807842716), (9.950000001, 16.525000003))
            Line((9.950000001, 16.525000003), (9.950000001, 11.757106783))
            ThreePointArc((9.950000001, 11.757106783), (9.919551814, 11.60403341), (9.832842714, 11.474264071))
            Line((9.832842714, 11.474264071), (6.458578646, 8.100000003))
            Line((6.458578646, 8.100000003), (-6.458578644, 8.100000003))
            Line((-6.458578644, 8.100000003), (-9.83284271, 11.474264069))
            ThreePointArc((-9.83284271, 11.474264069), (-9.91955181, 11.604033408), (-9.949999997, 11.757106781))
            Line((-9.949999997, 11.757106781), (-9.949999997, 16.525000004))
            ThreePointArc((-9.949999997, 16.525000004), (-9.83284271, 16.807842717), (-9.549999997, 16.925000004))
            Line((-9.549999997, 16.925000004), (-5.499999997, 16.925000004))
            ThreePointArc((-5.499999997, 16.925000004), (-5.075735928, 17.100735935), (-4.899999997, 17.525000004))
            Line((-4.899999997, 17.525000004), (-4.899999997, 20.500000004))
            ThreePointArc((-4.899999997, 20.500000004), (-5.075735928, 20.924264072), (-5.499999997, 21.100000004))
            Line((-5.499999997, 21.100000004), (-5.700000002, 21.100000004))
            Line((-5.700000002, 21.100000004), (-5.700000002, 22.000000001))
            ThreePointArc((-5.700000002, 22.000000001), (-5.875735933, 22.42426407), (-6.300000002, 22.600000001))
            Line((-6.300000002, 22.600000001), (-19.500000001, 22.600000001))
            ThreePointArc((-19.500000001, 22.600000001), (-21.692031023, 21.692031023), (-22.600000001, 19.500000001))
            Line((-22.600000001, 19.500000001), (-22.500000001, 19.500000001))
        make_face()
    extrude(amount=-TOLERANCE_CUT_Y_DEPTH, mode=Mode.SUBTRACT)

    # Sketch22 → Tolerance Cut X (cut)
    with BuildSketch(Plane(origin=(69.499999999, 0, 0), x_dir=(0, 0, -1), z_dir=(1, 0, 0)).offset(TOLERANCE_START)):
        with BuildLine():
            ThreePointArc((-45, 19.5), (-44.121320344, 21.621320344), (-42, 22.5))
            Line((-42, 22.5), (-28.8, 22.5))
            ThreePointArc((-28.8, 22.5), (-28.446446609, 22.353553391), (-28.3, 22))
            Line((-28.3, 22), (-28.3, 21))
            Line((-28.3, 21), (-28, 21))
            ThreePointArc((-28, 21), (-27.646446609, 20.853553391), (-27.5, 20.5))
            Line((-27.5, 20.5), (-27.5, 17.525))
            ThreePointArc((-27.5, 17.525), (-27.646446609, 17.171446609), (-28, 17.025))
            Line((-28, 17.025), (-32.55, 17.025))
            Line((-32.55, 17.025), (-32.55, 11.757106781))
            ThreePointArc((-32.55, 11.757106781), (-32.511939766, 11.565765065), (-32.403553391, 11.403553391))
            Line((-32.403553391, 11.403553391), (-29, 8))
            Line((-29, 8), (-16, 8))
            Line((-16, 8), (-12.596446609, 11.403553391))
            ThreePointArc((-12.596446609, 11.403553391), (-12.488060234, 11.565765065), (-12.45, 11.757106781))
            Line((-12.45, 11.757106781), (-12.45, 16.525))
            ThreePointArc((-12.45, 16.525), (-12.596446609, 16.878553391), (-12.95, 17.025))
            Line((-12.95, 17.025), (-17, 17.025))
            ThreePointArc((-17, 17.025), (-17.353553391, 17.171446609), (-17.5, 17.525))
            Line((-17.5, 17.525), (-17.5, 20.5))
            ThreePointArc((-17.5, 20.5), (-17.353553391, 20.853553391), (-17, 21))
            Line((-17, 21), (-16.7, 21))
            Line((-16.7, 21), (-16.7, 22))
            ThreePointArc((-16.7, 22), (-16.553553391, 22.353553391), (-16.2, 22.5))
            Line((-16.2, 22.5), (-7.8, 22.5))
            Line((-7.8, 22.5), (-7.8, 21.5))
            ThreePointArc((-7.8, 21.5), (-7.653553391, 21.146446609), (-7.3, 21))
            Line((-7.3, 21), (7.3, 21))
            ThreePointArc((7.3, 21), (7.653553391, 21.146446609), (7.8, 21.5))
            Line((7.8, 21.5), (7.8, 22.5))
            Line((7.8, 22.5), (16.2, 22.5))
            ThreePointArc((16.2, 22.5), (16.553553391, 22.353553391), (16.7, 22))
            Line((16.7, 22), (16.7, 21))
            Line((16.7, 21), (17, 21))
            ThreePointArc((17, 21), (17.353553391, 20.853553391), (17.5, 20.5))
            Line((17.5, 20.5), (17.5, 17.525))
            ThreePointArc((17.5, 17.525), (17.353553391, 17.171446609), (17, 17.025))
            Line((17, 17.025), (12.95, 17.025))
            ThreePointArc((12.95, 17.025), (12.596446609, 16.878553391), (12.45, 16.525))
            Line((12.45, 16.525), (12.45, 11.757106781))
            ThreePointArc((12.45, 11.757106781), (12.488060234, 11.565765065), (12.596446609, 11.403553391))
            Line((12.596446609, 11.403553391), (16, 8))
            Line((16, 8), (29, 8))
            Line((29, 8), (32.403553391, 11.403553391))
            ThreePointArc((32.403553391, 11.403553391), (32.511939766, 11.565765065), (32.55, 11.757106781))
            Line((32.55, 11.757106781), (32.55, 17.025))
            Line((32.55, 17.025), (28, 17.025))
            ThreePointArc((28, 17.025), (27.646446609, 17.171446609), (27.5, 17.525))
            Line((27.5, 17.525), (27.5, 20.5))
            ThreePointArc((27.5, 20.5), (27.646446609, 20.853553391), (28, 21))
            Line((28, 21), (28.3, 21))
            Line((28.3, 21), (28.3, 22))
            ThreePointArc((28.3, 22), (28.446446609, 22.353553391), (28.8, 22.5))
            Line((28.8, 22.5), (42, 22.5))
            ThreePointArc((42, 22.5), (44.121320344, 21.621320344), (45, 19.5))
            Line((45, 19.5), (45, 6.3))
            ThreePointArc((45, 6.3), (44.853553391, 5.946446609), (44.5, 5.8))
            Line((44.5, 5.8), (43.5, 5.8))
            Line((43.5, 5.8), (43.5, 5.5))
            ThreePointArc((43.5, 5.5), (43.353553391, 5.146446609), (43, 5))
            Line((43, 5), (40.025, 5))
            ThreePointArc((40.025, 5), (39.671446609, 5.146446609), (39.525, 5.5))
            Line((39.525, 5.5), (39.525, 9.55))
            ThreePointArc((39.525, 9.55), (39.378553391, 9.903553391), (39.025, 10.05))
            Line((39.025, 10.05), (34.257106781, 10.05))
            ThreePointArc((34.257106781, 10.05), (34.065765065, 10.011939766), (33.903553391, 9.903553391))
            Line((33.903553391, 9.903553391), (30.5, 6.5))
            Line((30.5, 6.5), (30.5, -6.5))
            Line((30.5, -6.5), (33.903553391, -9.903553391))
            ThreePointArc((33.903553391, -9.903553391), (34.065765065, -10.011939766), (34.257106781, -10.05))
            Line((34.257106781, -10.05), (39.025, -10.05))
            ThreePointArc((39.025, -10.05), (39.378553391, -9.903553391), (39.525, -9.55))
            Line((39.525, -9.55), (39.525, -5.5))
            ThreePointArc((39.525, -5.5), (39.671446609, -5.146446609), (40.025, -5))
            Line((40.025, -5), (43, -5))
            ThreePointArc((43, -5), (43.353553391, -5.146446609), (43.5, -5.5))
            Line((43.5, -5.5), (43.5, -5.8))
            Line((43.5, -5.8), (44.5, -5.8))
            ThreePointArc((44.5, -5.8), (44.853553391, -5.946446609), (45, -6.3))
            Line((45, -6.3), (45.000000001, -19.5))
            ThreePointArc((45.000000001, -19.5), (44.121320344, -21.621320344), (42, -22.500000001))
            Line((42, -22.500000001), (42, -22.600000001))
            ThreePointArc((42, -22.600000001), (44.192031022, -21.692031022), (45.100000001, -19.5))
            Line((45.100000001, -19.5), (45.1, -6.3))
            ThreePointArc((45.1, -6.3), (44.924264069, -5.875735931), (44.5, -5.7))
            Line((44.5, -5.7), (43.6, -5.7))
            Line((43.6, -5.7), (43.6, -5.5))
            ThreePointArc((43.6, -5.5), (43.424264069, -5.075735931), (43, -4.9))
            Line((43, -4.9), (40.025, -4.9))
            ThreePointArc((40.025, -4.9), (39.600735931, -5.075735931), (39.425, -5.5))
            Line((39.425, -5.5), (39.425, -9.55))
            ThreePointArc((39.425, -9.55), (39.307842712, -9.832842712), (39.025, -9.95))
            Line((39.025, -9.95), (34.257106781, -9.95))
            ThreePointArc((34.257106781, -9.95), (34.104033408, -9.919551813), (33.974264069, -9.832842712))
            Line((33.974264069, -9.832842712), (30.6, -6.458578644))
            Line((30.6, -6.458578644), (30.6, 6.458578644))
            Line((30.6, 6.458578644), (33.974264069, 9.832842713))
            ThreePointArc((33.974264069, 9.832842713), (34.104033408, 9.919551813), (34.257106781, 9.95))
            Line((34.257106781, 9.95), (39.025, 9.95))
            ThreePointArc((39.025, 9.95), (39.307842712, 9.832842713), (39.425, 9.55))
            Line((39.425, 9.55), (39.425, 5.5))
            ThreePointArc((39.425, 5.5), (39.600735931, 5.075735931), (40.025, 4.9))
            Line((40.025, 4.9), (43, 4.9))
            ThreePointArc((43, 4.9), (43.424264069, 5.075735931), (43.6, 5.5))
            Line((43.6, 5.5), (43.6, 5.7))
            Line((43.6, 5.7), (44.5, 5.7))
            ThreePointArc((44.5, 5.7), (44.924264069, 5.875735931), (45.1, 6.3))
            Line((45.1, 6.3), (45.1, 19.5))
            ThreePointArc((45.1, 19.5), (44.192031022, 21.692031022), (42, 22.6))
            Line((42, 22.6), (28.8, 22.6))
            ThreePointArc((28.8, 22.6), (28.375735931, 22.424264069), (28.2, 22))
            Line((28.2, 22), (28.2, 21.1))
            Line((28.2, 21.1), (28, 21.1))
            ThreePointArc((28, 21.1), (27.575735931, 20.924264069), (27.4, 20.5))
            Line((27.4, 20.5), (27.4, 17.525))
            ThreePointArc((27.4, 17.525), (27.575735931, 17.100735931), (28, 16.925))
            Line((28, 16.925), (32.45, 16.925))
            Line((32.45, 16.925), (32.45, 11.757106781))
            ThreePointArc((32.45, 11.757106781), (32.419551813, 11.604033408), (32.332842712, 11.474264069))
            Line((32.332842712, 11.474264069), (28.958578644, 8.1))
            Line((28.958578644, 8.1), (16.041421356, 8.1))
            Line((16.041421356, 8.1), (12.667157288, 11.474264069))
            ThreePointArc((12.667157288, 11.474264069), (12.580448187, 11.604033408), (12.55, 11.757106781))
            Line((12.55, 11.757106781), (12.55, 16.525))
            ThreePointArc((12.55, 16.525), (12.667157288, 16.807842713), (12.95, 16.925))
            Line((12.95, 16.925), (17, 16.925))
            ThreePointArc((17, 16.925), (17.424264069, 17.100735931), (17.6, 17.525))
            Line((17.6, 17.525), (17.6, 20.5))
            ThreePointArc((17.6, 20.5), (17.424264069, 20.924264069), (17, 21.1))
            Line((17, 21.1), (16.8, 21.1))
            Line((16.8, 21.1), (16.8, 22))
            ThreePointArc((16.8, 22), (16.624264069, 22.424264069), (16.2, 22.6))
            Line((16.2, 22.6), (7.7, 22.6))
            Line((7.7, 22.6), (7.7, 21.5))
            ThreePointArc((7.7, 21.5), (7.582842712, 21.217157288), (7.3, 21.1))
            Line((7.3, 21.1), (-7.3, 21.1))
            ThreePointArc((-7.3, 21.1), (-7.582842712, 21.217157288), (-7.7, 21.5))
            Line((-7.7, 21.5), (-7.7, 22.6))
            Line((-7.7, 22.6), (-16.2, 22.6))
            ThreePointArc((-16.2, 22.6), (-16.624264069, 22.424264069), (-16.8, 22))
            Line((-16.8, 22), (-16.8, 21.1))
            Line((-16.8, 21.1), (-17, 21.1))
            ThreePointArc((-17, 21.1), (-17.424264069, 20.924264069), (-17.6, 20.5))
            Line((-17.6, 20.5), (-17.6, 17.525))
            ThreePointArc((-17.6, 17.525), (-17.424264069, 17.100735931), (-17, 16.925))
            Line((-17, 16.925), (-12.95, 16.925))
            ThreePointArc((-12.95, 16.925), (-12.667157288, 16.807842712), (-12.55, 16.525))
            Line((-12.55, 16.525), (-12.55, 11.757106781))
            ThreePointArc((-12.55, 11.757106781), (-12.580448187, 11.604033408), (-12.667157288, 11.474264069))
            Line((-12.667157288, 11.474264069), (-16.041421356, 8.1))
            Line((-16.041421356, 8.1), (-28.958578644, 8.1))
            Line((-28.958578644, 8.1), (-32.332842712, 11.474264069))
            ThreePointArc((-32.332842712, 11.474264069), (-32.419551813, 11.604033408), (-32.45, 11.757106781))
            Line((-32.45, 11.757106781), (-32.45, 16.925))
            Line((-32.45, 16.925), (-28, 16.925))
            ThreePointArc((-28, 16.925), (-27.575735931, 17.100735931), (-27.4, 17.525))
            Line((-27.4, 17.525), (-27.4, 20.5))
            ThreePointArc((-27.4, 20.5), (-27.575735931, 20.924264069), (-28, 21.1))
            Line((-28, 21.1), (-28.2, 21.1))
            Line((-28.2, 21.1), (-28.2, 22))
            ThreePointArc((-28.2, 22), (-28.375735931, 22.424264069), (-28.8, 22.6))
            Line((-28.8, 22.6), (-42, 22.6))
            ThreePointArc((-42, 22.6), (-44.192031022, 21.692031022), (-45.1, 19.5))
            Line((-45.1, 19.5), (-45, 19.5))
        make_face()
    extrude(amount=TOLERANCE_CUT_X_DEPTH, mode=Mode.SUBTRACT)

    # Sharp Corner Fillets
    # the kernel refuses this fillet: 0.2 mm, written as the material it takes off along each edge
    with BuildSketch(Plane(origin=(21.100000002, 24.499999999, 16.799999997), x_dir=(1, 0, 0), z_dir=(0, 1, 0)), Plane(origin=(21.1, 24.499999999, 28.199999999), x_dir=(0, 0, -1), z_dir=(0, 1, 0)), Plane(origin=(5.700000001, 24.499999999, 1.399999996), x_dir=(-1, 0, 0), z_dir=(0, 1, 0)), Plane(origin=(-5.700000002, 24.499999999, 1.399999995), x_dir=(0, 0, -1), z_dir=(0, 1, 0))) as sharp_corner_fillets_piece_1:
        with BuildLine():
            CenterArc((SHARP_CORNER_FILLETS_R, -SHARP_CORNER_FILLETS_R), SHARP_CORNER_FILLETS_R, 90, 90)
            Line((0, -SHARP_CORNER_FILLETS_R), (0, 0))
            Line((0, 0), (SHARP_CORNER_FILLETS_R, 0))
        make_face()
    extrude(amount=45.5, mode=Mode.SUBTRACT)
    with BuildSketch(Plane(origin=(-22.500000001, 71.913499879, 2.21897503), x_dir=(0, 0, -1), z_dir=(0, -1, 0)), Plane(origin=(71.913499879, 20.281024968, 45), x_dir=(0, 1, 0), z_dir=(-1, 0, 0))) as sharp_corner_fillets_piece_2:
        with BuildLine():
            CenterArc((0.965399952, 0.2), SHARP_CORNER_FILLETS_R, 121.9527464, 148.0472536)
            ThreePointArc((0.859556018, 0.36969697), (0.44380678, 0.152231191), (0, 0))
            Line((0, 0), (0.965399952, 0))
        make_face()
    extrude(amount=47.41349988, mode=Mode.SUBTRACT)
    with BuildSketch(Plane(origin=(20.281024967, 71.91349988, 45), x_dir=(1, 0, 0), z_dir=(0, -1, 0))) as sharp_corner_fillets_piece_3:
        with BuildLine():
            CenterArc((0.965399952, -0.2), SHARP_CORNER_FILLETS_R, 90, 148.047253605)
            ThreePointArc((0.859556018, -0.36969697), (0.44380678, -0.152231191), (0, 0))
            Line((0, 0), (0.965399952, 0))
        make_face()
    extrude(amount=47.413499881, mode=Mode.SUBTRACT)
    with BuildSketch(Plane(origin=(21.1, -5.7, 45.5), x_dir=(1, 0, 0), z_dir=(0, 0, -1)), Plane(origin=(21.100000002, 5.700000002, 45.5), x_dir=(0, -1, 0), z_dir=(0, 0, -1)), Plane(origin=(5.700000001, 21.100000003, 45.5), x_dir=(0, 1, 0), z_dir=(0, 0, -1)), Plane(origin=(-5.700000002, 21.100000004, 45.5), x_dir=(1, 0, 0), z_dir=(0, 0, -1))) as sharp_corner_fillets_piece_4:
        with BuildLine():
            CenterArc((SHARP_CORNER_FILLETS_R, -SHARP_CORNER_FILLETS_R), SHARP_CORNER_FILLETS_R, 90, 90)
            Line((0, -SHARP_CORNER_FILLETS_R), (0, 0))
            Line((0, 0), (SHARP_CORNER_FILLETS_R, 0))
        make_face()
    extrude(amount=93, mode=Mode.SUBTRACT)
    with BuildSketch(Plane(origin=(-22.500000001, 20.281024969, -49.41349988), x_dir=(0.3951070153532721, 0.9186350997096885, 0), z_dir=(0, 0, 1))) as sharp_corner_fillets_piece_5:
        with BuildLine():
            CenterArc((0.965871684, 0.197709274), SHARP_CORNER_FILLETS_R, 113.272648501, 148.0472536)
            Line((0.886850281, 0.381436294), (0, 0))
            ThreePointArc((0, 0), (0.467844097, 0.035506257), (0.935688194, 0))
        make_face()
    extrude(amount=96.82699976, mode=Mode.SUBTRACT)
    with BuildSketch(Plane(origin=(20.281024967, -22.500000001, -49.413499881), x_dir=(1, 0, 0), z_dir=(0, 0, 1))) as sharp_corner_fillets_piece_6:
        with BuildLine():
            CenterArc((0.965399952, 0.2), SHARP_CORNER_FILLETS_R, 121.952746395, 148.047253605)
            ThreePointArc((0.859556018, 0.36969697), (0.44380678, 0.152231191), (0, 0))
            Line((0, 0), (0.965399952, 0))
        make_face()
    extrude(amount=96.826999761, mode=Mode.SUBTRACT)
    with BuildSketch(Plane(origin=(71.913499873, -22.5, -42.781024971), x_dir=(0, -2.099979945321112e-10, -1.0), z_dir=(-1, 0, 0))) as sharp_corner_fillets_piece_7:
        with BuildLine():
            CenterArc((0.96539995, -0.2), SHARP_CORNER_FILLETS_R, 90, 148.047253566)
            ThreePointArc((0.859556015, -0.36969697), (0.443806779, -0.152231191), (0, 0))
            Line((0, 0), (0.96539995, 0))
        make_face()
    extrude(amount=47.413499874, mode=Mode.SUBTRACT)
    with BuildSketch(Plane(origin=(24.499999999, -5.7, -43.6), x_dir=(0, 0, -1), z_dir=(1, 0, 0)), Plane(origin=(24.499999999, 5.7, -43.6), x_dir=(0, -1, 0), z_dir=(1, 0, 0)), Plane(origin=(24.499999999, 21.1, -28.2), x_dir=(0, 1, 0), z_dir=(1, 0, 0)), Plane(origin=(24.499999999, 21.1, -16.8), x_dir=(0, 0, -1), z_dir=(1, 0, 0)), Plane(origin=(24.499999999, 21.1, 16.8), x_dir=(0, 1, 0), z_dir=(1, 0, 0)), Plane(origin=(24.499999999, 21.1, 28.2), x_dir=(0, 0, -1), z_dir=(1, 0, 0))) as sharp_corner_fillets_piece_8:
        with BuildLine():
            CenterArc((SHARP_CORNER_FILLETS_R, SHARP_CORNER_FILLETS_R), SHARP_CORNER_FILLETS_R, 180, 90)
            Line((0, SHARP_CORNER_FILLETS_R), (0, 0))
            Line((0, 0), (SHARP_CORNER_FILLETS_R, 0))
        make_face()
    extrude(amount=45.5, mode=Mode.SUBTRACT)

    # Sketch23 → Cut-Extrude1 (cut, through all)
    with BuildSketch(Plane.XY.offset(45)):
        Polygon((24.499999999, 24.499999999), (0, 0), (0, -22.500000001), (69.499999999, -22.500000001), (69.499999999, 24.499999999), align=None)
    extrude(amount=-CUT_EXTRUDE1_DEPTH, mode=Mode.SUBTRACT)

    # Sketch24 → Cut-Extrude2 (cut)
    with BuildSketch(Plane(origin=(0, 69.499999999, 0), x_dir=(1, 0, 0), z_dir=(0, 1, 0)).offset(CUT_EXTRUDE2_START)):
        with BuildLine():
            Line((-4.899999997, -6.199999998), (-4.899999997, -4.974999995))
            ThreePointArc((-4.899999997, -4.974999995), (-5.075735928, -5.399264064), (-5.499999997, -5.574999995))
            Line((-5.499999997, -5.574999995), (-9.549999997, -5.574999995))
            ThreePointArc((-9.549999997, -5.574999995), (-9.83284271, -5.692157282), (-9.949999997, -5.974999995))
            Line((-9.949999997, -5.974999995), (-9.949999997, -6.199999998))
            Line((-9.949999997, -6.199999998), (-4.899999997, -6.199999998))
        make_face()
        with BuildLine():
            Line((-9.949999997, -10.216547618), (-9.949999997, -10.742893218))
            ThreePointArc((-9.949999997, -10.742893218), (-9.91955181, -10.89596659), (-9.83284271, -11.02573593))
            Line((-9.83284271, -11.02573593), (-6.458578644, -14.399999996))
            Line((-6.458578644, -14.399999996), (6.458578646, -14.399999996))
            Line((6.458578646, -14.399999996), (9.832842714, -11.025735928))
            ThreePointArc((9.832842714, -11.025735928), (9.919551814, -10.895966589), (9.950000001, -10.742893216))
            Line((9.950000001, -10.742893216), (9.950000001, -10.216547618))
            Line((9.950000001, -10.216547618), (7.54154762, -12.624999999))
            Line((7.54154762, -12.624999999), (-7.54154762, -12.624999999))
            Line((-7.54154762, -12.624999999), (-9.950000001, -10.216547618))
        make_face()
        with BuildLine():
            Line((12.283452379, -12.549999996), (11.757106782, -12.549999996))
            ThreePointArc((11.757106782, -12.549999996), (11.604033409, -12.580448183), (11.474264069, -12.667157283))
            Line((11.474264069, -12.667157283), (8.100000001, -16.041421352))
            Line((8.100000001, -16.041421352), (8.100000001, -28.266547624))
            Line((8.100000001, -28.266547624), (8.100000001, -28.958578641))
            Line((8.100000001, -28.958578641), (11.474264068, -32.332842709))
            ThreePointArc((11.474264068, -32.332842709), (11.604033408, -32.419551809), (11.75710678, -32.449999996))
            Line((11.75710678, -32.449999996), (12.283452379, -32.449999996))
            Line((12.283452379, -32.450000002), (9.875, -30.041547623))
            Line((9.875, -30.041547623), (9.875, -14.958452375))
            Line((9.875, -14.958452375), (12.283452379, -12.549999996))
        make_face()
        with BuildLine():
            Line((4.9, -6.199999998), (9.950000001, -6.199999998))
            Line((9.950000001, -6.199999998), (9.950000001, -5.974999996))
            ThreePointArc((9.950000001, -5.974999996), (9.832842713, -5.692157283), (9.550000001, -5.574999996))
            Line((9.550000001, -5.574999996), (5.5, -5.574999996))
            ThreePointArc((5.5, -5.574999996), (5.075735931, -5.399264064), (4.9, -4.974999996))
            Line((4.9, -4.974999996), (4.9, -6.199999998))
        make_face()
        with BuildLine():
            Line((16.925000003, -12.549999998), (16.300000001, -12.549999998))
            Line((16.300000001, -12.549999998), (16.300000001, -17.599999999))
            Line((16.300000001, -17.599999999), (17.525000003, -17.599999999))
            ThreePointArc((17.525000003, -17.599999994), (17.100735934, -17.424264063), (16.925000003, -16.999999994))
            Line((16.925000003, -16.999999994), (16.925000003, -12.549999996))
        make_face()
        with BuildLine():
            Line((16.300000001, -27.399999996), (16.300000001, -32.449999996))
            Line((16.300000001, -32.449999996), (16.525, -32.449999996))
            ThreePointArc((16.525, -32.449999996), (16.807842713, -32.332842708), (16.925000001, -32.049999996))
            Line((16.925000001, -32.049999996), (16.925000001, -27.999999995))
            ThreePointArc((16.925000001, -27.999999995), (17.100735932, -27.575735926), (17.525000001, -27.399999995))
            Line((17.525000001, -27.399999996), (16.300000001, -27.399999996))
        make_face()
    extrude(amount=CUT_EXTRUDE2_DEPTH, mode=Mode.SUBTRACT)

    # Sketch25 → Cut-Extrude3 (cut, through all)
    with BuildSketch(Plane.XY.offset(45)):
        with Locations((-7.424999997, 18.400000003)):
            Rectangle(SKETCH25_W, SKETCH25_H)
        with Locations((7.425000001, 18.400000002)):
            Rectangle(SKETCH25_W_2, SKETCH25_H_2)
        Polygon((9.950000001, 12.283452379), (12.283452379, 9.950000001), (8.100000003, 5.766547625), (5.766547625, 8.100000003), align=None)
        Rectangle(SKETCH25_W_3, SKETCH25_H_3)
        Polygon((-12.283452379, 9.950000001), (-8.100000003, 5.766547625), (-5.766547625, 8.100000003), (-9.950000001, 12.283452379), align=None)
    extrude(amount=-CUT_EXTRUDE3_DEPTH, mode=Mode.SUBTRACT)

    # Fillet1
    fillet1_edges = [part.edges().sort_by_distance(p)[0] for p in [
        (9.950000001, 46.999999999, 6.199999998),
        (16.300000001, 46.999999999, 32.449999996),
        (16.300000001, 46.999999999, 12.549999998),
        (9.875, 46.999999999, 14.958452375),
        (12.283452379, 46.999999999, 12.549999996),
        (9.950000001, 46.999999999, 10.216547618),
        (7.54154762, 46.999999999, 12.624999999),
        (12.283452379, 46.999999999, 32.449999999),
        (9.875, 46.999999999, 30.041547623),
        (-7.54154762, 46.999999999, 12.624999999),
        (-9.949999999, 46.999999999, 10.216547618),
        (-9.949999997, 46.999999999, 6.199999998),
    ]]
    fillet(fillet1_edges, radius=FILLET1_R)

    # Sketch26 → Cut-Extrude4 (cut, through all)
    with BuildSketch(Plane.XY.offset(45)):
        Polygon((-22.500000001, 69.499999999), (-22.500000001, 16.300000001), (-5.700000002, 22.000000001), (-5.700000002, 22.600000001), (0.845499998, 22.600000001), (1.432241195, 9.875), (24.499999999, 9.875), (24.499999999, 69.499999999), align=None)
    extrude(amount=-CUT_EXTRUDE4_DEPTH, mode=Mode.SUBTRACT)

    # Sketch27 → Boss-Extrude1 (add)
    with BuildSketch(Plane.XY.offset(45).offset(BOSS_EXTRUDE1_START)):
        with BuildLine():
            Line((1.432241195, 9.875), (0.845499998, 22.600000001))
            Line((0.845499998, 22.600000001), (-5.700000002, 22.600000001))
            Line((-5.700000002, 22.600000001), (-5.700000002, 21.300000004))
            ThreePointArc((-5.700000002, 21.300000004), (-5.641421357, 21.158578646), (-5.499999997, 21.100000004))
            ThreePointArc((-5.499999997, 21.100000004), (-5.075735928, 20.924264072), (-4.899999997, 20.500000004))
            Line((-4.899999997, 20.500000004), (-4.899999997, 16.300000001))
            Line((-4.899999997, 16.300000001), (-9.949999997, 16.300000001))
            Line((-9.949999997, 16.300000001), (-9.950000001, 12.283452379))
            Line((-9.950000001, 12.283452379), (-7.541547622, 9.875))
            Line((-7.541547622, 9.875), (1.432241195, 9.875))
        make_face()
    extrude(amount=-BOSS_EXTRUDE1_DEPTH)


solid = part.part
